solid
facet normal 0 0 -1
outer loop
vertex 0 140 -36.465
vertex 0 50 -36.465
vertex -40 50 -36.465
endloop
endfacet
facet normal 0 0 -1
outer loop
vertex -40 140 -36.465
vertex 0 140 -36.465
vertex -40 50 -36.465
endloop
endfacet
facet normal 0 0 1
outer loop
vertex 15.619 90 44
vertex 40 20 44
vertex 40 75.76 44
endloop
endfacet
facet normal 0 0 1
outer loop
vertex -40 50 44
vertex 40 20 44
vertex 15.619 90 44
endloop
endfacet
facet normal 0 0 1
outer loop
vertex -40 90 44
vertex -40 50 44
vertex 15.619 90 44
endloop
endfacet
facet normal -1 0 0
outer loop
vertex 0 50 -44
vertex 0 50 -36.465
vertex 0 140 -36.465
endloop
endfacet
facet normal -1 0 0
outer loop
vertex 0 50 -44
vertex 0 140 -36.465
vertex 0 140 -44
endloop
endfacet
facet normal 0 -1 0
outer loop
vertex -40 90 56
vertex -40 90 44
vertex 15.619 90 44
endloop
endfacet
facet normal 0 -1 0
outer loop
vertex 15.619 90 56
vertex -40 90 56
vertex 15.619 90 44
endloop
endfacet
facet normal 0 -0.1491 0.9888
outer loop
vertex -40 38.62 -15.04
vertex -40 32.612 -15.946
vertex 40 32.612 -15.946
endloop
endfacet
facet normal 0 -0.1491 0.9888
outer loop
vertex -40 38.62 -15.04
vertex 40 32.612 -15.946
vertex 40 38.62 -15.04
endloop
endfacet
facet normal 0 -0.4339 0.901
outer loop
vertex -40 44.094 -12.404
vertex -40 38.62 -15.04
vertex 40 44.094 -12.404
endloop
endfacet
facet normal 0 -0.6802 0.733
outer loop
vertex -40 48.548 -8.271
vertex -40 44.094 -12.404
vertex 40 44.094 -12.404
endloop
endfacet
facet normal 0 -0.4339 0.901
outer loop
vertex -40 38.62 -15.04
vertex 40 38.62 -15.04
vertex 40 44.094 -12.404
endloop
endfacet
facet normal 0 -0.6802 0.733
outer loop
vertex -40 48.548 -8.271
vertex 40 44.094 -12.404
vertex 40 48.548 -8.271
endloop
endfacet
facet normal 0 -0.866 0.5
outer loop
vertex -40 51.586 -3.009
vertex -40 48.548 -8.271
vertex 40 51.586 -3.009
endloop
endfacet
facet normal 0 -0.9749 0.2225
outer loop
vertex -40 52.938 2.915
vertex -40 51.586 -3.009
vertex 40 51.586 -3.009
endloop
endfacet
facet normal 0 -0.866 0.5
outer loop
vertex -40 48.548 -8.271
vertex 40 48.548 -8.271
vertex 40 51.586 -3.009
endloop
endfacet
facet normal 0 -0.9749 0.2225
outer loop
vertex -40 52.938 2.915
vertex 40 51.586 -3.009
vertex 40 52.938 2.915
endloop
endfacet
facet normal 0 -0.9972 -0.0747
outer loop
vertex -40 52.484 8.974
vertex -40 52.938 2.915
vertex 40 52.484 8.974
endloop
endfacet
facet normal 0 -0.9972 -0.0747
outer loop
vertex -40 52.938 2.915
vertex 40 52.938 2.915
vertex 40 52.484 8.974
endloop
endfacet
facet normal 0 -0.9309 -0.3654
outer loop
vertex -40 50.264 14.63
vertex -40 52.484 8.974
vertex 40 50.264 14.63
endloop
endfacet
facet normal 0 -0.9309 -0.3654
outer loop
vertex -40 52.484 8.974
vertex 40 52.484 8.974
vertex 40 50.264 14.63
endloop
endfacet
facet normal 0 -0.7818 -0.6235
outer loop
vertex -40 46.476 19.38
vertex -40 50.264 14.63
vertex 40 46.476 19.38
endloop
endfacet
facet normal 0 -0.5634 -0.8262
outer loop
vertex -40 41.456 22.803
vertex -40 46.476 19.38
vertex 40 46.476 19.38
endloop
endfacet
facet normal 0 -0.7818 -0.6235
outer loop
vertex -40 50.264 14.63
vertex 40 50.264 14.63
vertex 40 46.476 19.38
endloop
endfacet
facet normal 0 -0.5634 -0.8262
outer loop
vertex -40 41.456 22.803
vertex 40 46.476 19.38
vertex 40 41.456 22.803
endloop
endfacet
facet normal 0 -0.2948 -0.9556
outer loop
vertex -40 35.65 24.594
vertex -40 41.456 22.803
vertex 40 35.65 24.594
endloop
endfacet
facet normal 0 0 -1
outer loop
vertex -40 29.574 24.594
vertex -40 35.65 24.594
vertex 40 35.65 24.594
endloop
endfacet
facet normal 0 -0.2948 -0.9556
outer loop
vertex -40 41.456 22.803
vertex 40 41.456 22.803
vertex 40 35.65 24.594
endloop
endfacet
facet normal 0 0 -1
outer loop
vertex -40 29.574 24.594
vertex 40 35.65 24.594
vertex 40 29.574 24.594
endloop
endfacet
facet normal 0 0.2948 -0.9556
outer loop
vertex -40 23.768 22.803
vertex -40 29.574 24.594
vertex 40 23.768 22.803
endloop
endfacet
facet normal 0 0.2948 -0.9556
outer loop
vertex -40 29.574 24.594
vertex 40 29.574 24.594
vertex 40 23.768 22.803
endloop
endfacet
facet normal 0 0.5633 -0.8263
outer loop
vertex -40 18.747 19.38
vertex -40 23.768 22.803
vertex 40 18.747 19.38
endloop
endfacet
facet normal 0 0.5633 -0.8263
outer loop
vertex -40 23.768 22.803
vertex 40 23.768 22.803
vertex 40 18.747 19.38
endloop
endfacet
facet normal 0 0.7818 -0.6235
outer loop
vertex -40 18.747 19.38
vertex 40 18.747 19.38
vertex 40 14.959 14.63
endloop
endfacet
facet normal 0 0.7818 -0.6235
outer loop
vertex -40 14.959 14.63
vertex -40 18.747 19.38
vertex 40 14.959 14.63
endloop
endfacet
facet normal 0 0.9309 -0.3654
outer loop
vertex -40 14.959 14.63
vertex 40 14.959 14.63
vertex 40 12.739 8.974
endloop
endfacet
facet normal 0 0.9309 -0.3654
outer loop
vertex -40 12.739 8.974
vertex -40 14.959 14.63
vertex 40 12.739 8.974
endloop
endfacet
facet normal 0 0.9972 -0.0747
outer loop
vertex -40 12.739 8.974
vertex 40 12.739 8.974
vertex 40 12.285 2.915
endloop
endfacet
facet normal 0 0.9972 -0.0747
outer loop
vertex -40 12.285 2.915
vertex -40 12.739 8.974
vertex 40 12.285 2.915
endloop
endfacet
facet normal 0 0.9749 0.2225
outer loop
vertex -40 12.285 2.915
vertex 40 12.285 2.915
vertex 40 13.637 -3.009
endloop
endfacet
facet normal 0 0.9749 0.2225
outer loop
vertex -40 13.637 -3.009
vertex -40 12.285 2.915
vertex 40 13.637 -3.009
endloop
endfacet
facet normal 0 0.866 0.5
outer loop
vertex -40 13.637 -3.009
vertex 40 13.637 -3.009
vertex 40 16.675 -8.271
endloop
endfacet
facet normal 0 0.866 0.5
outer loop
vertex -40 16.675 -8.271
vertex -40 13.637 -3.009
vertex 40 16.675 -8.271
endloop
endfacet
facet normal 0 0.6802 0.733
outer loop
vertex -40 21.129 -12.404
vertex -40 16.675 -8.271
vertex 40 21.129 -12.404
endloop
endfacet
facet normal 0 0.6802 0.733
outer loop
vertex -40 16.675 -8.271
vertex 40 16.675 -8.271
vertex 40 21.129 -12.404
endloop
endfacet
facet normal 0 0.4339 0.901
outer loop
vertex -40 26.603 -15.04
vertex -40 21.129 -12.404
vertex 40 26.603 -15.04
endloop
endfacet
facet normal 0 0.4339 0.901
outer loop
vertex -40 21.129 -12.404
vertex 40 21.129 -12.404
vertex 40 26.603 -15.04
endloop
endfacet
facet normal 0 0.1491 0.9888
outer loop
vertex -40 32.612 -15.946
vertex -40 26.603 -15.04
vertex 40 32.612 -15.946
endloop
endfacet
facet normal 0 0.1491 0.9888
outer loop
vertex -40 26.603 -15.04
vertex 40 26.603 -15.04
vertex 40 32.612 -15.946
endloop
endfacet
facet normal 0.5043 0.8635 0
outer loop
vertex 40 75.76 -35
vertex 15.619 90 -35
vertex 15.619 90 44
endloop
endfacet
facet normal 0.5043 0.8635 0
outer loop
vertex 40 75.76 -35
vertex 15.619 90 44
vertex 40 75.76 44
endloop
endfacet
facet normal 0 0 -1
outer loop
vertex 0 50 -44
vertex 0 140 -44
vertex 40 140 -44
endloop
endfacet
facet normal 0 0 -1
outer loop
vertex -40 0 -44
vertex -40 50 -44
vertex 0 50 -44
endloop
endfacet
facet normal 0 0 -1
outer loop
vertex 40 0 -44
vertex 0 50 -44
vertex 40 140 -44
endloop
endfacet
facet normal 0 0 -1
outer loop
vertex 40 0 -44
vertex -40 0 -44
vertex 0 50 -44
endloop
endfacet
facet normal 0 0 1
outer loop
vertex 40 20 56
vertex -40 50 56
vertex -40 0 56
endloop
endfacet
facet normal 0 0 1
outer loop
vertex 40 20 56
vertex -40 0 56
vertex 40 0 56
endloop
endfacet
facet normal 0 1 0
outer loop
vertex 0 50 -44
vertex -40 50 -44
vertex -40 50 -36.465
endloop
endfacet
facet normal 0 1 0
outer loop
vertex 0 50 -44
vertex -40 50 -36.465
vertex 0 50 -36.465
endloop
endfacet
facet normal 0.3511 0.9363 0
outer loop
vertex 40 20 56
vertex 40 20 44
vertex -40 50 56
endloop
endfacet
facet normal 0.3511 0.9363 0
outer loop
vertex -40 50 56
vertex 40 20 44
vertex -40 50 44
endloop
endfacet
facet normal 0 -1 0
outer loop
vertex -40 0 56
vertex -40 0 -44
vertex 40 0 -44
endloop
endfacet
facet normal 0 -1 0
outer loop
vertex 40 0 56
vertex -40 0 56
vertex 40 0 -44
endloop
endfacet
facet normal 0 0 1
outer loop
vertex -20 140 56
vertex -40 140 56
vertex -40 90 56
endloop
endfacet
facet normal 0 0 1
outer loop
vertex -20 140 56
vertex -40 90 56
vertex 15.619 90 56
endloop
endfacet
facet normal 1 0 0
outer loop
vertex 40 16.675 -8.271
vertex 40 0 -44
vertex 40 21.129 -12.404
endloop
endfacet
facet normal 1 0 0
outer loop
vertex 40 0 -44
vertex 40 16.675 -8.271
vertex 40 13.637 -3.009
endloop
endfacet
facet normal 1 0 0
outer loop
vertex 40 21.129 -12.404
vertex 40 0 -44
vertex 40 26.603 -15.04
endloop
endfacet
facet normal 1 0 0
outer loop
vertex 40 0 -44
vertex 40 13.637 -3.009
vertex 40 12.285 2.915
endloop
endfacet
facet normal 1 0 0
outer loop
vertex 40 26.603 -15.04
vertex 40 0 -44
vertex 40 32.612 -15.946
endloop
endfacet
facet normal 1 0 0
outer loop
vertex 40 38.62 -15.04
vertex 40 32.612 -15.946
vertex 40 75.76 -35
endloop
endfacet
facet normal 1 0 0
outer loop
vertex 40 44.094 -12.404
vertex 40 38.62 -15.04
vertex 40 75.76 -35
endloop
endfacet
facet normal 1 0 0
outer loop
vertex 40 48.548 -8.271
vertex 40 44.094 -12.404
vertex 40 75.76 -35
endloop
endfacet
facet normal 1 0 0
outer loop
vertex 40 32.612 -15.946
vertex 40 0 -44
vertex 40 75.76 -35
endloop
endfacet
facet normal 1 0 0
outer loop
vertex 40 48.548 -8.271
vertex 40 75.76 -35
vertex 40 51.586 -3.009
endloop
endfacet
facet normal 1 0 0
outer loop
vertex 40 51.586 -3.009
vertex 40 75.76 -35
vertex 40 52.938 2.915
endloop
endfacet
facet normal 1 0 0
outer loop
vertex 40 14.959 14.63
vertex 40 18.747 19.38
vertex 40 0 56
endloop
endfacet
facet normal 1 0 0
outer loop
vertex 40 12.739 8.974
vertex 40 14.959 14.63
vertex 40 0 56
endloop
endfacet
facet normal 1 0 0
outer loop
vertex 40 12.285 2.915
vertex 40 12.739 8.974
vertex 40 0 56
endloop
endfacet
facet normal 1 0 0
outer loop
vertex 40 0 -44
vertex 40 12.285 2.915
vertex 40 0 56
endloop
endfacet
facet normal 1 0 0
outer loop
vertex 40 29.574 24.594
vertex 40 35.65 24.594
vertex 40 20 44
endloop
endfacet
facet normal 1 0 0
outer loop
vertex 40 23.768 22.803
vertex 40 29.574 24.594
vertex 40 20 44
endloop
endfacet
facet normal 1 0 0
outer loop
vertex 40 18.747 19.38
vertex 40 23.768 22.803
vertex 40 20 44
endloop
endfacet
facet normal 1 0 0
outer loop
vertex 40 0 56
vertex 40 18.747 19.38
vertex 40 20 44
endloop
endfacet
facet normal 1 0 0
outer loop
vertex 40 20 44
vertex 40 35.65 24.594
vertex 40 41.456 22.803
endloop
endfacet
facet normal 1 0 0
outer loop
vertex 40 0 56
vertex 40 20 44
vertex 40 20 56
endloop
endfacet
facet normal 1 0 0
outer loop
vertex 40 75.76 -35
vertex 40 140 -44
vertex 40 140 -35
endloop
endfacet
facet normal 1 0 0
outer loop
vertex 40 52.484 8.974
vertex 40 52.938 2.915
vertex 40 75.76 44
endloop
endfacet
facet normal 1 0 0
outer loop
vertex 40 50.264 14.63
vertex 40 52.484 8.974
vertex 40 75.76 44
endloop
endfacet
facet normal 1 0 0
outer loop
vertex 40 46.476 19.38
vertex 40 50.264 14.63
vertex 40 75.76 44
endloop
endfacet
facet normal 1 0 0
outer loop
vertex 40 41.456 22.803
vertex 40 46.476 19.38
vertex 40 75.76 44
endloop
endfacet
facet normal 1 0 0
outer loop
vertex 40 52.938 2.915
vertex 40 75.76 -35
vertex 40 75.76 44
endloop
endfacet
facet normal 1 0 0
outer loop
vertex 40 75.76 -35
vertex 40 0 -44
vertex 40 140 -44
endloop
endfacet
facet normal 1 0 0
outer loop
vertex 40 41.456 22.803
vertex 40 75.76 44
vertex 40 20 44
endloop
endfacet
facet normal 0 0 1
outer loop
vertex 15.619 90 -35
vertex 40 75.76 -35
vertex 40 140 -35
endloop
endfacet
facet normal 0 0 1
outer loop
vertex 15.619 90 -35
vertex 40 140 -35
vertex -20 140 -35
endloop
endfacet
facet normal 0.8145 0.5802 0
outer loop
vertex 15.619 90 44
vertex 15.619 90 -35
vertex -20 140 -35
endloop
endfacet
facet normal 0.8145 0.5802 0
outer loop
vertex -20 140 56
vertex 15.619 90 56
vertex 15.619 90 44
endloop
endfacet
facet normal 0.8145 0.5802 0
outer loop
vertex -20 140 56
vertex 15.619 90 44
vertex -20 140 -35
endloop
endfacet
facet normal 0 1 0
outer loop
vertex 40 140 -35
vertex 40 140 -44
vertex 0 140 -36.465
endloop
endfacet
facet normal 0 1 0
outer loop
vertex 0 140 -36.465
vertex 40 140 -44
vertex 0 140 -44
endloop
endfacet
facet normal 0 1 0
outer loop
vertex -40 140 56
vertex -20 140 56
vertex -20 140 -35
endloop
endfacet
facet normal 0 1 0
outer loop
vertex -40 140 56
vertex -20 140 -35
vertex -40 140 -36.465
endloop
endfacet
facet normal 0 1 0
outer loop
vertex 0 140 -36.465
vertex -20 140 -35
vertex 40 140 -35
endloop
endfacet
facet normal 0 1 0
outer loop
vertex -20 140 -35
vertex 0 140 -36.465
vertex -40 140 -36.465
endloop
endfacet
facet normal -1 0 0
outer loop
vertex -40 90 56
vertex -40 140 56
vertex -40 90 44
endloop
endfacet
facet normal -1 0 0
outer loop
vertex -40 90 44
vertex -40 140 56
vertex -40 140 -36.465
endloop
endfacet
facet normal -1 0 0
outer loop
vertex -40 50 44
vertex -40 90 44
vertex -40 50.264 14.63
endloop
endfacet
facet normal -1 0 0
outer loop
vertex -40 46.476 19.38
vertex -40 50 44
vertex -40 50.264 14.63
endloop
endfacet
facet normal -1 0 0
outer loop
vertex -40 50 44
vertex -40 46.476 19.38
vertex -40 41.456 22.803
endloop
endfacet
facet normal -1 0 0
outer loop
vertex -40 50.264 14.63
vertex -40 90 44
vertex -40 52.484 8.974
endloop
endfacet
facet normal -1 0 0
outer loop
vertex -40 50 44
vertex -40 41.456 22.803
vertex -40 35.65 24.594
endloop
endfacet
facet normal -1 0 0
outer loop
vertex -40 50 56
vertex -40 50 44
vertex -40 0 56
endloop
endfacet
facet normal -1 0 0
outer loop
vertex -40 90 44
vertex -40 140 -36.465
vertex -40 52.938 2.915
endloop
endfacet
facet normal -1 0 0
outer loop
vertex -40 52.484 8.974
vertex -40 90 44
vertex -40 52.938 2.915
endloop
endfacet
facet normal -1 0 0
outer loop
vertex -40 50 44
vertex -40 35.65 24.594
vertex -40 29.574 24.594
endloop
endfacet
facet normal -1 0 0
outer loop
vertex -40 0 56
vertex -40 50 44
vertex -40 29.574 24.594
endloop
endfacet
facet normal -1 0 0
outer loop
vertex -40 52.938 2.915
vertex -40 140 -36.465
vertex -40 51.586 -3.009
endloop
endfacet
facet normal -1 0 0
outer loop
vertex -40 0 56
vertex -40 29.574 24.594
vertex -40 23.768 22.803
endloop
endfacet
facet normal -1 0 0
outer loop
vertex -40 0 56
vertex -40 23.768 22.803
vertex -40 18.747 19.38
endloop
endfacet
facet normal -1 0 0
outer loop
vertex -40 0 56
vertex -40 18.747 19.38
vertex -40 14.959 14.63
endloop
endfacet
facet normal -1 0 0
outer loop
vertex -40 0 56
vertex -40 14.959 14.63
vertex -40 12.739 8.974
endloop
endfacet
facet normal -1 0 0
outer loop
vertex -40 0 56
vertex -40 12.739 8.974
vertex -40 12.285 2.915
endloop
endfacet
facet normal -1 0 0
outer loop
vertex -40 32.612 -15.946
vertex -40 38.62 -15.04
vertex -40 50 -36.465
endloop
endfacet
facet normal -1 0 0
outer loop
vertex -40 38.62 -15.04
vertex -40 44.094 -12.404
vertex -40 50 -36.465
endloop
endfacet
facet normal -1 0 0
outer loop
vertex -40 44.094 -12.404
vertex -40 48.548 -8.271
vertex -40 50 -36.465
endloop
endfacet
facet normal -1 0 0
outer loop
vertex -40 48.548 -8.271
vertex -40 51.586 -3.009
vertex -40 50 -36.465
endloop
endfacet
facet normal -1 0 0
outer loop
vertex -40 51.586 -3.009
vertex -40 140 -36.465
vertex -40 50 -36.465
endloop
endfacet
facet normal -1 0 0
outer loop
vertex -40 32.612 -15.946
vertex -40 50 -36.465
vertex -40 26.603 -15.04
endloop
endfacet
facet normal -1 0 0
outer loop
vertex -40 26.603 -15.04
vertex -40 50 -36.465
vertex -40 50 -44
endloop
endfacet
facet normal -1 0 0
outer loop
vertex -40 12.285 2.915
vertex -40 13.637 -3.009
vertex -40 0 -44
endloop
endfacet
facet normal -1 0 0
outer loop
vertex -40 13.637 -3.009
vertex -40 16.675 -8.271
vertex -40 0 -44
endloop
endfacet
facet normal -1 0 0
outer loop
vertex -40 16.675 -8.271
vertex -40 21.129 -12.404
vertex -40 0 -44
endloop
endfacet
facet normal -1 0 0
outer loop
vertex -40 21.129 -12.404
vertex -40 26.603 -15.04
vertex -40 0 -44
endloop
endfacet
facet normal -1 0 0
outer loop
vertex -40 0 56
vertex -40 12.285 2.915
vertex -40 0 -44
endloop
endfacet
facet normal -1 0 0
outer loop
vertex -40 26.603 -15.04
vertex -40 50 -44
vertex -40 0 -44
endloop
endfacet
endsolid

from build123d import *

# Parameters (mm, degrees)
CROQUIS1_W              = 80
CROQUIS1_H              = 88
SALIENTE_EXTRUIR2_DEPTH = 50
SALIENTE_EXTRUIR3_DEPTH = 12
SALIENTE_EXTRUIR4_DEPTH = 90
SALIENTE_EXTRUIR5_DEPTH = 12
CORTAR_EXTRUIR1_DEPTH   = 79
CORTAR_EXTRUIR3_DEPTH   = 34
CROQUIS13_R             = 20.383603437
CORTAR_EXTRUIR5_DEPTH   = 80
SALIENTE_EXTRUIR8_DEPTH = 34
CORTAR_EXTRUIR7_DEPTH   = 79


with BuildPart() as part:
    # Croquis1 → Saliente-Extruir2 (new body)
    with BuildSketch(Plane(origin=(0, 0, 0), x_dir=(1, 0, 0), z_dir=(0, 1, 0))):
        Rectangle(CROQUIS1_W, CROQUIS1_H)
    extrude(amount=SALIENTE_EXTRUIR2_DEPTH)

    # Croquis3 → Saliente-Extruir3 (add)
    with BuildSketch(Plane.XY.offset(44)):
        Polygon((40, 0), (40, 20), (-40, 50), (-40, 0), align=None)
    extrude(amount=SALIENTE_EXTRUIR3_DEPTH)

    # Croquis4 → Saliente-Extruir4 (add)
    with BuildSketch(Plane(origin=(0, 50, 0), x_dir=(1, 0, 0), z_dir=(0, 1, 0))):
        Polygon((-40, -44), (-40, 36.464593772), (-20, 36.464593772), (0, 36.464593772), (0, 44), (40, 44), (40, -44), align=None)
    extrude(amount=SALIENTE_EXTRUIR4_DEPTH)

    # Croquis6 → Saliente-Extruir5 (add)
    with BuildSketch(Plane.XY.offset(44)):
        Polygon((-40, 140), (-40, 90), (15.619160928, 90), (-20.00024501, 140), align=None)
    extrude(amount=SALIENTE_EXTRUIR5_DEPTH)

    # Croquis7 → Cortar-Extruir1 (cut)
    with BuildSketch(Plane.XY.offset(44)):
        Polygon((-20.00024501, 140), (40, 140), (40, 90), (15.619160928, 90), align=None)
    extrude(amount=-CORTAR_EXTRUIR1_DEPTH, mode=Mode.SUBTRACT)

    # Croquis8 → Cortar-Extruir3 (cut)
    with BuildSketch(Plane(origin=(40, 0, 0), x_dir=(0, 0, -1), z_dir=(1, 0, 0))):
        Polygon((35, 90), (35, 61.907696256), (-44, 60.140404664), (-44, 90), align=None)
    extrude(amount=-CORTAR_EXTRUIR3_DEPTH, mode=Mode.SUBTRACT)

    # Croquis13 → Cortar-Extruir5 (cut)
    with BuildSketch(Plane(origin=(40, 0, 0), x_dir=(0, 0, -1), z_dir=(1, 0, 0))):
        with Locations((-4.438083907, 32.611633529)):
            Circle(CROQUIS13_R)
    extrude(amount=-CORTAR_EXTRUIR5_DEPTH, mode=Mode.SUBTRACT)

    # Croquis16 → Saliente-Extruir8 (add)
    with BuildSketch(Plane(origin=(6, 0, 0), x_dir=(0, 0, -1), z_dir=(1, 0, 0))):
        Polygon((-44, 90), (35, 90), (35, 61.907696256), (-44, 60.140404664), align=None)
    extrude(amount=SALIENTE_EXTRUIR8_DEPTH)

    # Croquis17 → Cortar-Extruir7 (cut)
    with BuildSketch(Plane.XY.offset(44)):
        Polygon((15.619160928, 90), (40, 75.759565592), (40, 90), align=None)
    extrude(amount=-CORTAR_EXTRUIR7_DEPTH, mode=Mode.SUBTRACT)


solid = part.part
